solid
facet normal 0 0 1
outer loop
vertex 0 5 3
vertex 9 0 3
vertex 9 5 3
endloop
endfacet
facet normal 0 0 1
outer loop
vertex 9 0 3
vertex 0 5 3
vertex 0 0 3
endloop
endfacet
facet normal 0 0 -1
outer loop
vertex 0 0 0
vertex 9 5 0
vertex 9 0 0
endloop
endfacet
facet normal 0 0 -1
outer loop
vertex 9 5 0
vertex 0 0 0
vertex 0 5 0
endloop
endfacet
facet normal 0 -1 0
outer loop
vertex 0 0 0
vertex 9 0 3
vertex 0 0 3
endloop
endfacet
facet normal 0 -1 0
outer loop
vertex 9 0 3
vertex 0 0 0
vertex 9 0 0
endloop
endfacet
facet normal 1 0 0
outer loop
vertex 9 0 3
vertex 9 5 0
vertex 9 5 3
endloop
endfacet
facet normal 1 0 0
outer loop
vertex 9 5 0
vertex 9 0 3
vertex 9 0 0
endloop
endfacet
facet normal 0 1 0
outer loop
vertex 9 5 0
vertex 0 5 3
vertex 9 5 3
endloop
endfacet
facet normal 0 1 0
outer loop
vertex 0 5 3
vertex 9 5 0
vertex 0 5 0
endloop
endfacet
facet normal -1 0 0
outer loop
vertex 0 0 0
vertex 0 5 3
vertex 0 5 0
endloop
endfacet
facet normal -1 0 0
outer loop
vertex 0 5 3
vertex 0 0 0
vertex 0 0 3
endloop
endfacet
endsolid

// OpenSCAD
// Generated by SolidPython 1.0.1 on 2020-07-29 00:46:55


cube(size = [9, 5, 3]);
/***********************************************
*********      SolidPython code:      **********
************************************************
 
# import packages: SolidPython
from solid import *
from solid.utils import *
from itertools import chain, combinations, permutations


class Resize:

    def __init__(self, scad_file):
        self.scad_file = scad_file
        #self.scad_file = import_scad(scad_file)
        # cone/cylinder param:
        self.r1 = 0
        self.r2 = 0
        self.h = 0
        # rectangular prism param:
        self.w = 0
        self.l = 0
        # ellipse param:
        self.r = 0

    # import OpenScad code (file name corresponds to shape)


    # classify shape + parameters
    def assign(self, param1, param2, param3):
        if self.scad_file == 'cone.scad':
            self.r1 = param1
            self.r2 = param2
            self.h = param3
        elif self.scad_file == 'cylinder.scad':
            self.r1 = param1
            self.r2 = param2
            self.h = param3
        elif self.scad_file == 'rectangularPrism.scad':
            self.h = param1
            self.l = param2
            self.w = param3
        else:
            self.r = param1
            self.h = param2

    # resize parameters
    def iterate(self):
        x = range(3, 20, 2)
        i = 1
        if self.scad_file == 'cone.scad':
            tempList = list(permutations(x, 2))
            for temp in tempList:
                param1 = temp[0]
                param2 = temp[1]
                filepath = 'produced_scad_files/' + 'cone' + str(param1) + '_' + str(param2) + '_' + '.scad'
                scad_render_to_file(cylinder(h=param1, r1=param2, r2=0), filepath)

        elif self.scad_file == 'cylinder.scad':
            tempList = list(permutations(x, 3))
            for temp in tempList:
                param1 = temp[0]
                param2 = temp[1]
                filepath = 'produced_scad_files/' + 'cylinder' + str(param1) + '_' + str(param2) + '_' + '.scad'
                scad_render_to_file(cylinder(h=param1, r1=param2, r2=param2), filepath)

        elif self.scad_file == 'rectangularPrism.scad':
            tempList = list(permutations(x, 3))
            for temp in tempList:
                param1 = temp[0]
                param2 = temp[1]
                param3 = temp[2]
                filepath = 'produced_scad_files/' + 'rectangularPrism' + str(param1) + '_' + str(param2) + '_' + str(
                    param3) + '.scad'
                scad_render_to_file(cube(size=(param1, param2, param3)), filepath)

        elif self.scad_file == 'ellipse.scad':
            tempList = list(permutations(x, 4))
            for temp in tempList:
                param1 = temp[0]
                param2 = temp[1]
                param3 = temp[2]
                param4 = temp[3]
                filepath = 'produced_scad_files/' + 'ellipse' + str(param1) + '_' + str(param2) + '_' + str(param3) + '_' + str(param4) + '.scad'
                scad_render_to_file(scale([param1, param2, param3])(sphere(r=param4)), filepath)

    def render_to_scadfile(self):
        scad_render_to_file(scad, 'example.scad') 
 
************************************************/
